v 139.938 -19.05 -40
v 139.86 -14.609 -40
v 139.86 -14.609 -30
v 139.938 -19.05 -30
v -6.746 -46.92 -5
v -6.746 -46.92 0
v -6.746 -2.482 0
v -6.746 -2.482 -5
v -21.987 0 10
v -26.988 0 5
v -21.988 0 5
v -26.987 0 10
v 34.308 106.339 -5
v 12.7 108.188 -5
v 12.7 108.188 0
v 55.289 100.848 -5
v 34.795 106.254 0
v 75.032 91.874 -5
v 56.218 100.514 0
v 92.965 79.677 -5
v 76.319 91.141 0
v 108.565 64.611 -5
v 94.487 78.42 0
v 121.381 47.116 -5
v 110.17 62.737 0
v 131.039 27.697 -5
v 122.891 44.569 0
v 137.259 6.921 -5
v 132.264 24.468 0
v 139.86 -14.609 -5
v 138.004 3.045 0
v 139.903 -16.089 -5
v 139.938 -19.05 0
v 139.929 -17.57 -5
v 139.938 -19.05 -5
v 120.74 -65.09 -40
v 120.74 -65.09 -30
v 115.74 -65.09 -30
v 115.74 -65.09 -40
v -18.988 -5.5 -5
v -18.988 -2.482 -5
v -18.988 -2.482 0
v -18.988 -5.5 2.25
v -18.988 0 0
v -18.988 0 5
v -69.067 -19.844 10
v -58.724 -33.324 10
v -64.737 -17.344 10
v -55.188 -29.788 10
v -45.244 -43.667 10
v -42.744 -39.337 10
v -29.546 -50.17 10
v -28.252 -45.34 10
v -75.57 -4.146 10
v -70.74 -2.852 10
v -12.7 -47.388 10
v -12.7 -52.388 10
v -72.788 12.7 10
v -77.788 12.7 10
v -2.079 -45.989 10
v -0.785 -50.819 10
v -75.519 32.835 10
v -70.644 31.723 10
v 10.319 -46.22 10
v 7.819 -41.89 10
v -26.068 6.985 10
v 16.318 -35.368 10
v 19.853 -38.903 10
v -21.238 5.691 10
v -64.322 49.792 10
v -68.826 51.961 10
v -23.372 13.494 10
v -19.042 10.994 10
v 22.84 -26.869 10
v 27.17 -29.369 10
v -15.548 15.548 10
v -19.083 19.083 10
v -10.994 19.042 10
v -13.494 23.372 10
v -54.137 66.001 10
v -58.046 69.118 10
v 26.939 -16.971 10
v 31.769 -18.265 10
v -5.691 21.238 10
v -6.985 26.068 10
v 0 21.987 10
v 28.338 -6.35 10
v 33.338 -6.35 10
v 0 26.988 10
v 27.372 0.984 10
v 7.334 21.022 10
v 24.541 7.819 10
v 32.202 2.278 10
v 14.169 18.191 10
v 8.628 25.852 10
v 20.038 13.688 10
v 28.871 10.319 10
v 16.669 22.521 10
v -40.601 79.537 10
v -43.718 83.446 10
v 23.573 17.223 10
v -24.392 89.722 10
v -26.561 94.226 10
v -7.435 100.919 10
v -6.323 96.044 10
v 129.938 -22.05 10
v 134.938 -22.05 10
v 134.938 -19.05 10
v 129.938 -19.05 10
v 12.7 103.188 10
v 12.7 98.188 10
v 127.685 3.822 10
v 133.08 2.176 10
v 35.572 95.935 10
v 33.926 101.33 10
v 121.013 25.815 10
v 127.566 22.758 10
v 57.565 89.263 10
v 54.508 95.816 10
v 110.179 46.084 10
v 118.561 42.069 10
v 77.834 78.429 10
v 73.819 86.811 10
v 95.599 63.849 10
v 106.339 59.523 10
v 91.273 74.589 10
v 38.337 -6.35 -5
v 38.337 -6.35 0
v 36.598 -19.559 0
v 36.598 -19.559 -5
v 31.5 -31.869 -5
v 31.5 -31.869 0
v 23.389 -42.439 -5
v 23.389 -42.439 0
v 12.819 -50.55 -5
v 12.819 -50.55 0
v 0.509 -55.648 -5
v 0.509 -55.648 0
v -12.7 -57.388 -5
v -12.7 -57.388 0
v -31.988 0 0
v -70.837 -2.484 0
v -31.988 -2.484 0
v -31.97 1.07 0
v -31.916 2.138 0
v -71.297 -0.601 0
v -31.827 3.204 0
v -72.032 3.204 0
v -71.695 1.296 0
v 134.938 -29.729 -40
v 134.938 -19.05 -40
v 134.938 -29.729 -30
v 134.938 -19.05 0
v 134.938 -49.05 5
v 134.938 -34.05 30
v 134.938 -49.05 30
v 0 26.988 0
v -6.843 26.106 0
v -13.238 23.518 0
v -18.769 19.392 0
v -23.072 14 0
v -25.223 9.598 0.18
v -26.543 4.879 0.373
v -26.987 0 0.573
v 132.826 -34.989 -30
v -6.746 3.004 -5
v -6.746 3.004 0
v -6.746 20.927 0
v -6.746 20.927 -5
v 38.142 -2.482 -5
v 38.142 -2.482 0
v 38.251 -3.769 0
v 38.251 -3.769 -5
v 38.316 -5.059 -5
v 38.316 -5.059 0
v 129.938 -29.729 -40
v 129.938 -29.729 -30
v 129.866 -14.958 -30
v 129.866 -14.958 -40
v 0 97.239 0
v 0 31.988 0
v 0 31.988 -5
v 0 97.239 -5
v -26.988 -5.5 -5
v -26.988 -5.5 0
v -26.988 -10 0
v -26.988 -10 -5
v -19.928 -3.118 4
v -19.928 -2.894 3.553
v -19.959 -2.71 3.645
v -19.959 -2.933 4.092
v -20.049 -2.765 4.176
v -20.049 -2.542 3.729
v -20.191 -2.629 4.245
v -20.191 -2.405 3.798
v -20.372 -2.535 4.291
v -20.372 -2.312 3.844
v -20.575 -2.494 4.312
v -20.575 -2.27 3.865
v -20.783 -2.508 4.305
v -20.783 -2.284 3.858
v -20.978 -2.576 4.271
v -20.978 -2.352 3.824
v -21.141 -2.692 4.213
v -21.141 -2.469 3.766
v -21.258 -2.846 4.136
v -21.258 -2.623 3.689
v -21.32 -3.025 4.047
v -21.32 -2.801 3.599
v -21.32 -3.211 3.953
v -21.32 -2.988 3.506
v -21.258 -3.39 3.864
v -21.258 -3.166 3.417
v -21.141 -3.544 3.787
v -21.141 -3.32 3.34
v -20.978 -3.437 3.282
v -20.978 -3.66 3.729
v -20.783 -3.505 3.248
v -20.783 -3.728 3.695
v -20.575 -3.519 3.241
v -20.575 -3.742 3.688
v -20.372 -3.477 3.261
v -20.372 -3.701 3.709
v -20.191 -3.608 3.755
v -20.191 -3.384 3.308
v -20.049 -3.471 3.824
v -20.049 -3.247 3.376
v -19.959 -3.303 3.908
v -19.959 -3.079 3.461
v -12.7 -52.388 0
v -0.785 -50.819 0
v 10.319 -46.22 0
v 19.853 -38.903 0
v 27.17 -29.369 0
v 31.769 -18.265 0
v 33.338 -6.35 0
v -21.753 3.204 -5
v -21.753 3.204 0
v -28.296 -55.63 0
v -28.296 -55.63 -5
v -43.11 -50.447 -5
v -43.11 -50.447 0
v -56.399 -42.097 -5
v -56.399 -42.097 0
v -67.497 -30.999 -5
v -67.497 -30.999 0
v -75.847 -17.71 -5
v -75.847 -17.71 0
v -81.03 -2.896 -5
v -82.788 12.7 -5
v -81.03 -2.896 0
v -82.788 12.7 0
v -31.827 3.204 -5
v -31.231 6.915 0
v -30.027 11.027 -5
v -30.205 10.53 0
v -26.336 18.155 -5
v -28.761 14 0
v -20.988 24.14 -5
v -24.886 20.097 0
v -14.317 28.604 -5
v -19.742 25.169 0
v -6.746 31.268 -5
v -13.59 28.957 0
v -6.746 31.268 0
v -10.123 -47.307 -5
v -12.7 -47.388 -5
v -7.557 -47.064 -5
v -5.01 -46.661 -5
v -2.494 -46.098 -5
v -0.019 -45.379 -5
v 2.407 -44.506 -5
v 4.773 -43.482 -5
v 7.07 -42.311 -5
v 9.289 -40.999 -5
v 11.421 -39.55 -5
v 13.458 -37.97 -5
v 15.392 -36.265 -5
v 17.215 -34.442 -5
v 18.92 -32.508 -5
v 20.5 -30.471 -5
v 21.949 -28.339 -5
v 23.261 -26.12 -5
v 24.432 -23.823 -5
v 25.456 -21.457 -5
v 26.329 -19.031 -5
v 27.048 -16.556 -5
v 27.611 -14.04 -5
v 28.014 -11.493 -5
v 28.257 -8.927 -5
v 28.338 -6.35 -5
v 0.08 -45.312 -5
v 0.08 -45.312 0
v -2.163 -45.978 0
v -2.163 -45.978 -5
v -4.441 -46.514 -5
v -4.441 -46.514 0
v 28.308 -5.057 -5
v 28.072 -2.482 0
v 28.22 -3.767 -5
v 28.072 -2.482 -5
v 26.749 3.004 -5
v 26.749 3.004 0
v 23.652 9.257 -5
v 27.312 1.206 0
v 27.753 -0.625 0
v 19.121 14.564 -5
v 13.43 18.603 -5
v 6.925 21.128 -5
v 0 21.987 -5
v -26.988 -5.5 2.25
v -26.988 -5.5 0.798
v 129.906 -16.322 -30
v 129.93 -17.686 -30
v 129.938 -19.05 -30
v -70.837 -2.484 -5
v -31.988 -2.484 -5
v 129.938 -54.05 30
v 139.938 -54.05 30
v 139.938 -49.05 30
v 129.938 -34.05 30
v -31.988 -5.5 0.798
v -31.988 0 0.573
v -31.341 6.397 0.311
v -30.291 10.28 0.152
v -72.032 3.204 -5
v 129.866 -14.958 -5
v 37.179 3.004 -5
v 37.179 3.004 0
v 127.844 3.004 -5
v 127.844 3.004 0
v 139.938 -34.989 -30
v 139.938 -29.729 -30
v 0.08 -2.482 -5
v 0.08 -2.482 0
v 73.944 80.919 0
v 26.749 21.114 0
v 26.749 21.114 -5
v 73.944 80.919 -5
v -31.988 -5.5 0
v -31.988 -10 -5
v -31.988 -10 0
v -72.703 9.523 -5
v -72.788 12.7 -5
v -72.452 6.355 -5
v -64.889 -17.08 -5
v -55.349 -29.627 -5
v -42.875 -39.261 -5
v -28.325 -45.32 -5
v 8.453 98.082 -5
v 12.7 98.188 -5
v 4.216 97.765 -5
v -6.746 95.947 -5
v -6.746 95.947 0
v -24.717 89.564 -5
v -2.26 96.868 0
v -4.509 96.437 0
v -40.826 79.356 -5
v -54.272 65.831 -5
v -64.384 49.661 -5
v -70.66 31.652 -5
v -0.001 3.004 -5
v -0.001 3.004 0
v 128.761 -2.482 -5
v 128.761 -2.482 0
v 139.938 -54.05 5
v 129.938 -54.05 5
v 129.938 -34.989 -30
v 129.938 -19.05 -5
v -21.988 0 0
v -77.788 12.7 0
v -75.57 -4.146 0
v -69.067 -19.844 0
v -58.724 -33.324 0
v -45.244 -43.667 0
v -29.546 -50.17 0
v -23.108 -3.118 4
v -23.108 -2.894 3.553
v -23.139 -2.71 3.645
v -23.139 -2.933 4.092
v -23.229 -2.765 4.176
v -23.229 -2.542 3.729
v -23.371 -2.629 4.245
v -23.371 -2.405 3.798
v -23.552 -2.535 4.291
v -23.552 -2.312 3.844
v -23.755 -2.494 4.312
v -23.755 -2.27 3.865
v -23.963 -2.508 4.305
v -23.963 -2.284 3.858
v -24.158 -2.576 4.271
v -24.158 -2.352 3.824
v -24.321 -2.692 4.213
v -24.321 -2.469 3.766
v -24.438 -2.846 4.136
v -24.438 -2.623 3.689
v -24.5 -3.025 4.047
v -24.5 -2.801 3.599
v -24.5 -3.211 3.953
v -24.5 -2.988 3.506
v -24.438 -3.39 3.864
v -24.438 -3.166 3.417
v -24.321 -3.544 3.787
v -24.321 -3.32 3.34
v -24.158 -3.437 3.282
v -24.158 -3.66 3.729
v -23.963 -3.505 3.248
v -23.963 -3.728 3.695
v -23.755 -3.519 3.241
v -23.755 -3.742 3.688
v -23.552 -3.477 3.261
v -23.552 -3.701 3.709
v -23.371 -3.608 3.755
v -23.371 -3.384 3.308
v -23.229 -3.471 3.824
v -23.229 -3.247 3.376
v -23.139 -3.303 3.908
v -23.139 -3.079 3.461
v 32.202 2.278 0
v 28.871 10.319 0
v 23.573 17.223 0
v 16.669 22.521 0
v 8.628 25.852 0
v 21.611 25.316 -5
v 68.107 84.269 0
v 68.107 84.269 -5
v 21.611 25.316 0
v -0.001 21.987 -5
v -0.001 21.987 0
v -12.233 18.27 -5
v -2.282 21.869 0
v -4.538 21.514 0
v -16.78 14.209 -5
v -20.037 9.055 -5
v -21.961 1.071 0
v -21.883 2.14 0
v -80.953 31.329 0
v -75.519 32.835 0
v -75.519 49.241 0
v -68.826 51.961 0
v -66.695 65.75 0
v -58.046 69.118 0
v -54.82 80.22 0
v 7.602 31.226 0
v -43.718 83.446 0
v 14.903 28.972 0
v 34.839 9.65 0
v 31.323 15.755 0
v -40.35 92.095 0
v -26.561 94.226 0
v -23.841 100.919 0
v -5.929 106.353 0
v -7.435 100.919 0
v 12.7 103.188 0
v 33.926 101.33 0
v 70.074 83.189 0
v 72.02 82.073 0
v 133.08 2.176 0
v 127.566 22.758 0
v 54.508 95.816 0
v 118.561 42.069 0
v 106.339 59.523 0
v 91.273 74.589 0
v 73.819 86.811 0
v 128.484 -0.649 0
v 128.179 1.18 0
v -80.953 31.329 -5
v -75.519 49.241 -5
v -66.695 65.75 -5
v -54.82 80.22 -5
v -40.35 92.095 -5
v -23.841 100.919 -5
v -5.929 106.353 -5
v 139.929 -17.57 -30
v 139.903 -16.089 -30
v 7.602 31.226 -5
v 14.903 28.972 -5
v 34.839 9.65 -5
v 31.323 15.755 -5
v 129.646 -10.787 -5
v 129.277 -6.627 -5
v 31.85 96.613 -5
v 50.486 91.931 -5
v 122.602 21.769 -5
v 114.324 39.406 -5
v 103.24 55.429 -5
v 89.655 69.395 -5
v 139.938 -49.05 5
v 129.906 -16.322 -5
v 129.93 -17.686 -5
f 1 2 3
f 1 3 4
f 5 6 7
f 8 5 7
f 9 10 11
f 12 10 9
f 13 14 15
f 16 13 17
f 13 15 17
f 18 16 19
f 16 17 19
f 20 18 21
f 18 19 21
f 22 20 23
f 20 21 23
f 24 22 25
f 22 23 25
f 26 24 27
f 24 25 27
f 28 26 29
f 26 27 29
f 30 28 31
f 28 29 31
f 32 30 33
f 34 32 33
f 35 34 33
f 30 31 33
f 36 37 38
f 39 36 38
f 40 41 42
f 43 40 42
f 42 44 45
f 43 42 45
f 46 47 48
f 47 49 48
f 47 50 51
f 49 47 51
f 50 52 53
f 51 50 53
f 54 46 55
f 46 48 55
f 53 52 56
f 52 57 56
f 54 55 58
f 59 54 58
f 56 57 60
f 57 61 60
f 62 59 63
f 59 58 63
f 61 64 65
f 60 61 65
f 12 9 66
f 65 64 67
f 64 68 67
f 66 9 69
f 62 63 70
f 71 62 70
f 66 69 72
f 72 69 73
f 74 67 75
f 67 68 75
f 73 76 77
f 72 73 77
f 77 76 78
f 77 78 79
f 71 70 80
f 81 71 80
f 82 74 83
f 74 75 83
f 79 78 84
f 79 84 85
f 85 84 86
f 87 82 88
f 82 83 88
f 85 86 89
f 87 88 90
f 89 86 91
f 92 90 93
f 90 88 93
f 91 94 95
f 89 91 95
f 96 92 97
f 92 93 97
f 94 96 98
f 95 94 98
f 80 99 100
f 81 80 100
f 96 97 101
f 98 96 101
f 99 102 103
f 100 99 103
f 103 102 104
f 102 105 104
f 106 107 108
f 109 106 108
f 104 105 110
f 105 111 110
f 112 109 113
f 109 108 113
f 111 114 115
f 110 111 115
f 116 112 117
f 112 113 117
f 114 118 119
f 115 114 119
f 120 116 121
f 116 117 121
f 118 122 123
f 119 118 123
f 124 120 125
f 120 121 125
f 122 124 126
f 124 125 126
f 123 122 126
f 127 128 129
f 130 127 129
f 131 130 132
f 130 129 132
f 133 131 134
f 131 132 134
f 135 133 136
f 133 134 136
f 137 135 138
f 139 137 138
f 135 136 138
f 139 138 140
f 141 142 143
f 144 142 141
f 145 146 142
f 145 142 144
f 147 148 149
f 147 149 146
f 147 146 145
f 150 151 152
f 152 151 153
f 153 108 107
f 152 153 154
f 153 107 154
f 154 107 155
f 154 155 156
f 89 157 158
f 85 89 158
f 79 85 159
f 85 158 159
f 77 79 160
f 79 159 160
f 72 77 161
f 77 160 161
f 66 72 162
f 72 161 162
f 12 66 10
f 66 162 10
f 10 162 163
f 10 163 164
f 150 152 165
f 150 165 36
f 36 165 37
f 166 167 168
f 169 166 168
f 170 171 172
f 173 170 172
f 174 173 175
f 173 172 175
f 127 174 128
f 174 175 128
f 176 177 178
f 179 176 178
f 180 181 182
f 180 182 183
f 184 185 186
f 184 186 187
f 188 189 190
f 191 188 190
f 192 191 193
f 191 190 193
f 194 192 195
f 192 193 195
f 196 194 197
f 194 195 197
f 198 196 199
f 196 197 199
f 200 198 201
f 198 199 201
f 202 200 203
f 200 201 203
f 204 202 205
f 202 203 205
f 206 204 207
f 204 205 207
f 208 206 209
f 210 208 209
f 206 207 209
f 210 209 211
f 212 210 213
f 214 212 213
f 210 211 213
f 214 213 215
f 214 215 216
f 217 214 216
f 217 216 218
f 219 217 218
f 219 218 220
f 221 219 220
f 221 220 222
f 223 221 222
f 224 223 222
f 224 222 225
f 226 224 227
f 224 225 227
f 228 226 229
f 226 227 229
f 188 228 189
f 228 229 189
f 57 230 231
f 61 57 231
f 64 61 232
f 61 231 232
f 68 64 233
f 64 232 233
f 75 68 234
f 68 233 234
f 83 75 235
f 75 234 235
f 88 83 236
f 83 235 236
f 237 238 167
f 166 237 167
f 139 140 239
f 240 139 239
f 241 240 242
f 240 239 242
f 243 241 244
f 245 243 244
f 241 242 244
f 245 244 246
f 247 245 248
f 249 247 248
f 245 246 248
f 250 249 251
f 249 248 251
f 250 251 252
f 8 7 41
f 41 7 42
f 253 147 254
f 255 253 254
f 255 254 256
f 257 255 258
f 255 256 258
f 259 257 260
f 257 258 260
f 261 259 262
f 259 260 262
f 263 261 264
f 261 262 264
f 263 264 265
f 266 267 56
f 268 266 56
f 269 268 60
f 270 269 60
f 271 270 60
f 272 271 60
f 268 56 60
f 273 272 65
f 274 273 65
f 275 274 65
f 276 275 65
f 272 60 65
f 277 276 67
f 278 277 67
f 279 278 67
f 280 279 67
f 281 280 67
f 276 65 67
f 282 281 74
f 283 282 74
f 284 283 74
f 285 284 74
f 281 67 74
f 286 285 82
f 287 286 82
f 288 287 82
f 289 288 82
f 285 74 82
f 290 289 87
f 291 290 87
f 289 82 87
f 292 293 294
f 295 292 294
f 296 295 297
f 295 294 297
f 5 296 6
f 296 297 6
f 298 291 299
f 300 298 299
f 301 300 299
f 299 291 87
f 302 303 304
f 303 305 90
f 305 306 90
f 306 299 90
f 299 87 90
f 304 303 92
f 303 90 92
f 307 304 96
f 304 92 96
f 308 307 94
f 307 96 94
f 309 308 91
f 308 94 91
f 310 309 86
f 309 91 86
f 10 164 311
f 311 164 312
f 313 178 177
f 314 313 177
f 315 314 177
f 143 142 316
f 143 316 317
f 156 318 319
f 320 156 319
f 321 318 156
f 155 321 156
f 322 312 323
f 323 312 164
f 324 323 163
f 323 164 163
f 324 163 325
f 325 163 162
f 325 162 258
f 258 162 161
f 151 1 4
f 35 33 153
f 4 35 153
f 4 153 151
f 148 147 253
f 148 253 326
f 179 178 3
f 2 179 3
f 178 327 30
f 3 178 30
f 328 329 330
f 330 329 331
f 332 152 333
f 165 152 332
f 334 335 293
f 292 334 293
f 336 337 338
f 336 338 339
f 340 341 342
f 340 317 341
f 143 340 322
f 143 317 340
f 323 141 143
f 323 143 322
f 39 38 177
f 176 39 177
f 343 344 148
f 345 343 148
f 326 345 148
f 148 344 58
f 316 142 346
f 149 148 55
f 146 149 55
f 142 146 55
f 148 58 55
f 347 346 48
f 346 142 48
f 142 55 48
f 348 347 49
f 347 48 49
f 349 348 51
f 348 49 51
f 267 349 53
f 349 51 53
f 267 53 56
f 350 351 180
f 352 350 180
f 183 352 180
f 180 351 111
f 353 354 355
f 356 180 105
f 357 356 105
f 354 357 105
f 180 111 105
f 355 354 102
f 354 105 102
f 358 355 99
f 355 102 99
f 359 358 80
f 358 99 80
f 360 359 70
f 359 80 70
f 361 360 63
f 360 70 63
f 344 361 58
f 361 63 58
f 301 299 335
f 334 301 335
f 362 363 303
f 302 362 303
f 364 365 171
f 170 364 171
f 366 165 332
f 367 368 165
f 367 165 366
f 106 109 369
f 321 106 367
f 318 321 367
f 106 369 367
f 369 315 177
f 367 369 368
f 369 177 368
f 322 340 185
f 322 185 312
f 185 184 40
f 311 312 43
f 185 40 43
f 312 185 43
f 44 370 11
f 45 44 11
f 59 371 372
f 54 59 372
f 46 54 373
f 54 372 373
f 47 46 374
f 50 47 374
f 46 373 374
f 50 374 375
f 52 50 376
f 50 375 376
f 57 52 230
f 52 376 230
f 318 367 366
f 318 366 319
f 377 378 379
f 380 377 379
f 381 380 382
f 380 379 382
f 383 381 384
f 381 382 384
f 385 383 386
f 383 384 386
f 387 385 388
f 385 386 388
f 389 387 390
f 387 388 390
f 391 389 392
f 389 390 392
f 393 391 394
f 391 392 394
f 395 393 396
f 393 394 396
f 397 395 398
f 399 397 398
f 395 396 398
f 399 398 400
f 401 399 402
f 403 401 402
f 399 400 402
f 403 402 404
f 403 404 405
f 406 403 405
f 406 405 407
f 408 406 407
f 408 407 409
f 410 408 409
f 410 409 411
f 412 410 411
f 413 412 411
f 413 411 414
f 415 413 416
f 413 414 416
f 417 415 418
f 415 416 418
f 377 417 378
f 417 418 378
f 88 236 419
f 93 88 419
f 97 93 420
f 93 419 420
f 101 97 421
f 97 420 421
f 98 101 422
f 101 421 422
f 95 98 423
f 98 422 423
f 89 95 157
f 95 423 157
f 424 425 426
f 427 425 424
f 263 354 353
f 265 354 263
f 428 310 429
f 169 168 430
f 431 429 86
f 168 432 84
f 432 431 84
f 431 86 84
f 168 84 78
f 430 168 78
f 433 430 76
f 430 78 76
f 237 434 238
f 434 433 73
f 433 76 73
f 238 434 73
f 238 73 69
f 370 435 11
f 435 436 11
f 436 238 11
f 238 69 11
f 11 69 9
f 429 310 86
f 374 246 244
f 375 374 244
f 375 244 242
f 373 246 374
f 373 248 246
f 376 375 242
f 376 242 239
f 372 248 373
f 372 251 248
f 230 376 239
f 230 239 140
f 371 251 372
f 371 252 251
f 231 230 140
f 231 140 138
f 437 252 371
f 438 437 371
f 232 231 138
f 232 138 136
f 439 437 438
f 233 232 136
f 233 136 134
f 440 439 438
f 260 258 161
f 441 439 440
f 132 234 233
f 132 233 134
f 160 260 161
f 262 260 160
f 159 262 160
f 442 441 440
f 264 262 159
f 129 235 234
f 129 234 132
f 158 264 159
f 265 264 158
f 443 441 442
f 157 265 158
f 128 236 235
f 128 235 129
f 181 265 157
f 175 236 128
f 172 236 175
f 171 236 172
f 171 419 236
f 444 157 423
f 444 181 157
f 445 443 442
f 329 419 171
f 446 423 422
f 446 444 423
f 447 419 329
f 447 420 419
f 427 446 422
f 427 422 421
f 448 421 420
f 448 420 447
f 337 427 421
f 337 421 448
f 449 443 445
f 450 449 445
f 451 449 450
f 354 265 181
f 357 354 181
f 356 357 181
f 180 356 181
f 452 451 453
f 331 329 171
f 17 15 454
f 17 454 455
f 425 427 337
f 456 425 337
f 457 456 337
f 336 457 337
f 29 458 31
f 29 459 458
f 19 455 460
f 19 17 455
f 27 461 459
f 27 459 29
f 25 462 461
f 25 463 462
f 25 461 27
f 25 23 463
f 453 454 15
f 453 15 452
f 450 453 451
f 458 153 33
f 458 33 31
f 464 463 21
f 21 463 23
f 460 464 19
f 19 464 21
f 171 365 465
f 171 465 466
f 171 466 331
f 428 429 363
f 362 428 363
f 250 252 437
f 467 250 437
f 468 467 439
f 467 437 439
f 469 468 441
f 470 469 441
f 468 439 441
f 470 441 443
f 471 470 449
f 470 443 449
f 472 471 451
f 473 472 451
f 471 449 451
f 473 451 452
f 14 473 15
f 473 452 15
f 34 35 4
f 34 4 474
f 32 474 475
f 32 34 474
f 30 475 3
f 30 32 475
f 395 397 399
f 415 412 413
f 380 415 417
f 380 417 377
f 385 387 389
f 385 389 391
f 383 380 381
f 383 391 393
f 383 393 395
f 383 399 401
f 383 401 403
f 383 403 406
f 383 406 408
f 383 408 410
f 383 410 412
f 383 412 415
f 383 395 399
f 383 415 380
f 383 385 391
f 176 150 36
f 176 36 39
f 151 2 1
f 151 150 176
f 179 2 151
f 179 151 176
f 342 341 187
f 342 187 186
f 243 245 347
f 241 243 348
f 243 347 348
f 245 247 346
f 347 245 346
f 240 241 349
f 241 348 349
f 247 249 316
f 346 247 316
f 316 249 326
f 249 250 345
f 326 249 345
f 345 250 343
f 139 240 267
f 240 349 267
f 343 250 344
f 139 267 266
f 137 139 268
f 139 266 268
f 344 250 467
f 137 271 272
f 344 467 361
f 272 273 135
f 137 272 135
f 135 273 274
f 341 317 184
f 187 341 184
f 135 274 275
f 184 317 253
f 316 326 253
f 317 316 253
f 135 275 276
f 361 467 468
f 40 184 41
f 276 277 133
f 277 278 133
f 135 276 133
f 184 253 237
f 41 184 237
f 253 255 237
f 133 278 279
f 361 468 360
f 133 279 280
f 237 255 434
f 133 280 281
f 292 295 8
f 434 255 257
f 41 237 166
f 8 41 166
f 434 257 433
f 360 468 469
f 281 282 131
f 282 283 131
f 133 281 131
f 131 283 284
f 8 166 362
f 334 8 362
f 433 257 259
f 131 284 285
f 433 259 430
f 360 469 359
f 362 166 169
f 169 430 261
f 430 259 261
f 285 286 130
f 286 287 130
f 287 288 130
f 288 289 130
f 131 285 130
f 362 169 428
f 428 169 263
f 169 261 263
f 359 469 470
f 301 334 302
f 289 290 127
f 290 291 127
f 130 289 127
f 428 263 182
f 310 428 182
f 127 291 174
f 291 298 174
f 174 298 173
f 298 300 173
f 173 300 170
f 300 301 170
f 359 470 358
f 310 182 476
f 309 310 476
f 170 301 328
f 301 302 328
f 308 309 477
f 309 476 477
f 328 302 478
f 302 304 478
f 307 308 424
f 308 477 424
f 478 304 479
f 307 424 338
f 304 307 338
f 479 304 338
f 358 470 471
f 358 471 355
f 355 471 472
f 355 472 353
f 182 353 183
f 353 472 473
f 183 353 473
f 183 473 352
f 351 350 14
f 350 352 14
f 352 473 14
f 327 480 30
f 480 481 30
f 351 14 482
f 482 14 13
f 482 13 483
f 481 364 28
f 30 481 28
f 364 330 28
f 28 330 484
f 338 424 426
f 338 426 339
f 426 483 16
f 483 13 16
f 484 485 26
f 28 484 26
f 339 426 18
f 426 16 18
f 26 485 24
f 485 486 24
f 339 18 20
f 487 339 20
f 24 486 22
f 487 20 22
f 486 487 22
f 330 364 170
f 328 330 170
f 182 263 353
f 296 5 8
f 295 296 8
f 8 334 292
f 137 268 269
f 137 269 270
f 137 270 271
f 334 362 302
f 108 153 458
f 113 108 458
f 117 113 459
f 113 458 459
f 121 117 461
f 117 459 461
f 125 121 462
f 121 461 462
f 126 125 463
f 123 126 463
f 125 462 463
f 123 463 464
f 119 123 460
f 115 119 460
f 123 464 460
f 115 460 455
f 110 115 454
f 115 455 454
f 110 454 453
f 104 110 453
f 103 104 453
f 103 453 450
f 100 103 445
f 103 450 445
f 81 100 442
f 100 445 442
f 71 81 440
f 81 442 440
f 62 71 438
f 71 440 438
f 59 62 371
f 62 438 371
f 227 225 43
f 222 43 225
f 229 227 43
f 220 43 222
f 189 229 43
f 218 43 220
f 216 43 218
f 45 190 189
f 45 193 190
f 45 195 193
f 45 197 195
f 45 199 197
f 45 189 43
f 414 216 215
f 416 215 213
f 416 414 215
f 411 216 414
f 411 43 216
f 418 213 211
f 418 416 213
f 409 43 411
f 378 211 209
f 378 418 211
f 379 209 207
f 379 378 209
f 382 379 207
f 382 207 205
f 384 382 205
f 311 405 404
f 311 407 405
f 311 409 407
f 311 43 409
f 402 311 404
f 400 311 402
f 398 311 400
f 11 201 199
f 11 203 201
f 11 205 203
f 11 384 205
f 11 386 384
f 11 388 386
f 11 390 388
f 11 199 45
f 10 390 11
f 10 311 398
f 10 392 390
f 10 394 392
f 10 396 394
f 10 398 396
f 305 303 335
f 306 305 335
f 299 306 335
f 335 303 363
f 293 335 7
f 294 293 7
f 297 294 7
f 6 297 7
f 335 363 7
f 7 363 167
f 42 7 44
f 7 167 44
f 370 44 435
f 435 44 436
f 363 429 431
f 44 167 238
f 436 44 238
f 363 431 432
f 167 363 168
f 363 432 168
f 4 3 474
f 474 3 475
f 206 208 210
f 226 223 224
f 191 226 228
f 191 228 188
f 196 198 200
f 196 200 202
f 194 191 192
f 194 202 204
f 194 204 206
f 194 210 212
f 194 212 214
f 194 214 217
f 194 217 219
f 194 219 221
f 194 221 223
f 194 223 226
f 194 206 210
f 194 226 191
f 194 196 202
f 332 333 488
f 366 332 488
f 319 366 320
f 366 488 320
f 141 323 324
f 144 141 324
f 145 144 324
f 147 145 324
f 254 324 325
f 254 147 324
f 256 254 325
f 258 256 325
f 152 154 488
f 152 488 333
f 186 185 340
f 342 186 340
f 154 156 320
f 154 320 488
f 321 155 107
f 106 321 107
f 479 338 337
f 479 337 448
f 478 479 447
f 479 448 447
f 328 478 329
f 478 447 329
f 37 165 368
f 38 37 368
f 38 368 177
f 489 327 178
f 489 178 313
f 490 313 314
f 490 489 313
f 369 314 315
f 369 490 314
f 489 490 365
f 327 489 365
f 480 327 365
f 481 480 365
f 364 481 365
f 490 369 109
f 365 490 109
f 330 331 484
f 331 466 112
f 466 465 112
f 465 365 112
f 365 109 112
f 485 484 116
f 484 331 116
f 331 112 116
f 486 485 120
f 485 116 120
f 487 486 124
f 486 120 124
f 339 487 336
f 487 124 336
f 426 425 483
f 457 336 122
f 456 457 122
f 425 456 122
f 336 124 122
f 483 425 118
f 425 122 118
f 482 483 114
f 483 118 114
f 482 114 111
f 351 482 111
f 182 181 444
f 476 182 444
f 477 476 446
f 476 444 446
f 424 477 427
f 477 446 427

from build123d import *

# Parameters (mm, degrees)
EXTRUDE2_DEPTH      = 10
EXTRUDE3_DEPTH      = 5
CUT_EXTRUDE1_DEPTH  = 5
EXTRUDE4_DEPTH      = 3
CUT_EXTRUDE2_DEPTH  = 8
EXTRUDE5_DEPTH      = 5
EXTRUDE5_DEPTH_BACK = 5
CUT_EXTRUDE3_DEPTH  = 5
SKETCH9_W           = 5
SKETCH9_H           = 15
EXTRUDE6_DEPTH      = 35
SKETCH11_W          = 5
SKETCH11_H          = 35
EXTRUDE8_DEPTH      = 25
EXTRUDE9_DEPTH      = 25
EXTRUDE12_DEPTH     = 20
EXTRUDE13_DEPTH     = 5
CUT_EXTRUDE5_DEPTH  = 5
EXTRUDE14_DEPTH     = 10
EXTRUDE19_DEPTH     = 5
SKETCH21_R          = 0.7
EXTRUDE20_DEPTH     = 0.5


with BuildPart() as part:
    # Sketch2 → Extrude2 (new body)
    with BuildSketch(Plane.XY):
        with BuildLine():
            Line((-26.9875, 0), (-26.9875, -10))
            Line((-26.9875, -10), (-21.9875, -10))
            Line((-21.9875, -10), (-21.9875, 0))
            ThreePointArc((-21.9875, 0), (-15.547510351, 15.547510351), (0, 21.9875))
            ThreePointArc((0, 21.9875), (20.037638412, 13.687638412), (28.3375, -6.35))
            ThreePointArc((28.3375, -6.35), (16.317894533, -35.367894533), (-12.7, -47.3875))
            ThreePointArc((-12.7, -47.3875), (-55.188278715, -29.788278715), (-72.7875, 12.7))
            ThreePointArc((-72.7875, 12.7), (-47.748790957, 73.148790957), (12.7, 98.1875))
            ThreePointArc((12.7, 98.1875), (95.599431259, 63.849431259), (129.9375, -19.05))
            Line((129.9375, -19.05), (134.9375, -19.05))
            ThreePointArc((134.9375, -19.05), (99.134965165, 67.384965165), (12.7, 103.1875))
            ThreePointArc((12.7, 103.1875), (-51.284324863, 76.684324863), (-77.7875, 12.7))
            ThreePointArc((-77.7875, 12.7), (-58.72381262, -33.32381262), (-12.7, -52.3875))
            ThreePointArc((-12.7, -52.3875), (19.853428439, -38.903428439), (33.3375, -6.35))
            ThreePointArc((33.3375, -6.35), (23.573172318, 17.223172318), (0, 26.9875))
            ThreePointArc((0, 26.9875), (-19.083044257, 19.083044257), (-26.9875, 0))
        make_face()
    extrude(amount=EXTRUDE2_DEPTH)

    # Sketch3 → Extrude3 (add)
    with BuildSketch(Plane.XY):
        with BuildLine():
            Line((-21.9875, 0), (-21.9875, -10))
            Line((-21.9875, -10), (-31.9875, -10))
            Line((-31.9875, -10), (-31.9875, 0))
            ThreePointArc((-31.9875, 0), (-22.618578163, 22.618578163), (0, 31.9875))
            ThreePointArc((0, 31.9875), (27.108706224, 20.758706224), (38.3375, -6.35))
            ThreePointArc((38.3375, -6.35), (23.388962345, -42.438962345), (-12.7, -57.3875))
            ThreePointArc((-12.7, -57.3875), (-62.259346526, -36.859346526), (-82.7875, 12.7))
            ThreePointArc((-82.7875, 12.7), (-54.819858769, 80.219858769), (12.7, 108.1875))
            ThreePointArc((12.7, 108.1875), (102.670499071, 70.920499071), (139.9375, -19.05))
            Line((139.9375, -19.05), (129.9375, -19.05))
            ThreePointArc((129.9375, -19.05), (95.599431259, 63.849431259), (12.7, 98.1875))
            ThreePointArc((12.7, 98.1875), (-47.748790957, 73.148790957), (-72.7875, 12.7))
            ThreePointArc((-72.7875, 12.7), (-55.188278715, -29.788278715), (-12.7, -47.3875))
            ThreePointArc((-12.7, -47.3875), (16.317894533, -35.367894533), (28.3375, -6.35))
            ThreePointArc((28.3375, -6.35), (20.037638412, 13.687638412), (0, 21.9875))
            ThreePointArc((0, 21.9875), (-15.547510351, 15.547510351), (-21.9875, 0))
        make_face()
    extrude(amount=-EXTRUDE3_DEPTH)

    # Sketch4 → Cut-Extrude1 (cut)
    with BuildSketch(Plane.ZY.offset(26.9875)):
        Polygon((0, -10), (5, 0), (10, 0), (10, -10), align=None)
    extrude(amount=-CUT_EXTRUDE1_DEPTH, mode=Mode.SUBTRACT)

    # Sketch5 → Extrude4 (add)
    with BuildSketch(Plane(origin=(-21.9875, 0, 0), x_dir=(0, 0, -1), z_dir=(1, 0, 0))):
        Polygon((0, -10), (-5, 0), (0, 0), (5, 0), (5, -10), align=None)
    extrude(amount=EXTRUDE4_DEPTH)

    # Sketch6 → Cut-Extrude2 (cut)
    with BuildSketch(Plane(origin=(-18.9875, 0, 0), x_dir=(0, 0, -1), z_dir=(1, 0, 0))):
        Polygon((5, -5.5), (-2.25, -5.5), (0, -10), (5, -10), align=None)
    extrude(amount=-CUT_EXTRUDE2_DEPTH, mode=Mode.SUBTRACT)

    # Sketch7 → Extrude5 (add, two sides)
    with BuildSketch(Plane.ZY.offset(26.9875)) as extrude5_sk:
        Polygon((0, -5.5), (0.798113635, -5.5), (0, 14), align=None)
    extrude(amount=EXTRUDE5_DEPTH)
    extrude(extrude5_sk.sketch, amount=-EXTRUDE5_DEPTH_BACK)

    # Sketch8 → Cut-Extrude3 (cut)
    with BuildSketch(Plane.XY):
        with BuildLine():
            Line((-28.761087536, 14), (-31.9875, 14))
            Line((-31.9875, 14), (-31.9875, 0))
            ThreePointArc((-31.9875, 0), (-31.170462331, 7.183483441), (-28.761087536, 14))
        make_face()
    extrude(amount=CUT_EXTRUDE3_DEPTH, mode=Mode.SUBTRACT)

    # Sketch9 → Extrude6 (add)
    with BuildSketch(Plane.XZ.offset(19.05)):
        with Locations((132.4375, 2.5)):
            Rectangle(SKETCH9_W, SKETCH9_H)
    extrude(amount=EXTRUDE6_DEPTH)

    # Sketch11 → Extrude8 (add)
    with BuildSketch(Plane(origin=(0, 0, -5), x_dir=(-1, 0, 0), z_dir=(0, 0, -1))):
        with Locations((-132.4375, -36.55)):
            Rectangle(SKETCH11_W, SKETCH11_H)
    extrude(amount=EXTRUDE8_DEPTH)

    # Sketch12 → Extrude9 (add)
    with BuildSketch(Plane(origin=(0, 0, -5), x_dir=(-1, 0, 0), z_dir=(0, 0, -1))):
        with BuildLine():
            Line((-129.9375, -19.05), (-139.9375, -19.05))
            ThreePointArc((-139.9375, -19.05), (-139.918121112, -16.829399436), (-139.859990353, -14.609475288))
            Line((-139.859990353, -14.609475288), (-129.866082083, -14.958470255))
            ThreePointArc((-129.866082083, -14.958470255), (-129.919644161, -17.0039235), (-129.9375, -19.05))
        make_face()
    extrude(amount=EXTRUDE9_DEPTH)

    # Sketch16 → Extrude12 (add)
    with BuildSketch(Plane.XY.offset(10)):
        Polygon((129.9375, -19.05), (129.9375, -54.05), (139.9375, -54.05), (139.9375, -49.05), (134.9375, -49.05), (134.9375, -19.05), align=None)
    extrude(amount=EXTRUDE12_DEPTH)

    # Sketch17 → Extrude13 (add)
    with BuildSketch(Plane(origin=(134.9375, 0, 0), x_dir=(0, 0, -1), z_dir=(1, 0, 0))):
        Polygon((-10, -54.05), (-10, -49.05), (-5, -49.05), (30, -29.72873513), (30, -34.988734421), (-5, -54.05), align=None)
    extrude(amount=EXTRUDE13_DEPTH)

    # Sketch18 → Cut-Extrude5 (cut)
    with BuildSketch(Plane(origin=(134.9375, 0, 0), x_dir=(0, 0, -1), z_dir=(1, 0, 0))):
        Polygon((-5, -54.05), (30, -34.988734421), (30, -54.05), align=None)
        Polygon((-30, -19.05), (-30, -34.05), (-10, -22.05), (-10, -19.05), align=None)
    extrude(amount=-CUT_EXTRUDE5_DEPTH, mode=Mode.SUBTRACT)

    # Sketch19 → Extrude14 (add)
    with BuildSketch(Plane(origin=(0, 0, -30), x_dir=(-1, 0, 0), z_dir=(0, 0, -1))):
        Polygon((-134.9375, -19.05), (-134.9375, -29.72873513), (-120.74, -65.09), (-115.74, -65.09), (-129.9375, -29.72873513), (-129.866082083, -14.958470255), (-139.859990353, -14.609475288), (-139.9375, -19.05), align=None)
    extrude(amount=EXTRUDE14_DEPTH)

    # Sketch20 → Extrude19 (add)
    with BuildSketch(Plane.XY):
        with BuildLine():
            Line((128.760903372, -2.482015371), (38.141874641, -2.482015371))
            ThreePointArc((38.141874641, -2.482015371), (37.760120708, 0.278513435), (37.178841709, 3.004017073))
            Line((37.178841709, 3.004017073), (127.844482009, 3.004017073))
            ThreePointArc((127.844482009, 3.004017073), (128.335231203, 0.266436289), (128.760903372, -2.482015371))
        make_face()
        with BuildLine():
            Line((0, 31.9875), (0, 97.238882511))
            ThreePointArc((0, 97.238882511), (-3.385770157, 96.660470787), (-6.745571925, 95.946515776))
            Line((-6.745571925, 95.946515776), (-6.745571925, 31.268153378))
            ThreePointArc((-6.745571925, 31.268153378), (-3.391909497, 31.807154953), (0, 31.9875))
        make_face()
        with BuildLine():
            Line((-0.000749496, 21.987499987), (-0.000749496, 3.004017073))
            Line((-0.000749496, 3.004017073), (26.74913589, 3.004017073))
            ThreePointArc((26.74913589, 3.004017073), (27.547611511, 0.294020339), (28.072274599, -2.482015371))
            Line((28.072274599, -2.482015371), (0.080484541, -2.482015371))
            Line((0.080484541, -2.482015371), (0.080484541, -45.312306862))
            ThreePointArc((0.080484541, -45.312306862), (-3.298138872, -46.262230565), (-6.745571925, -46.919996909))
            Line((-6.745571925, -46.919996909), (-6.745571925, -2.482015371))
            Line((-6.745571925, -2.482015371), (-18.9875, -2.482015371))
            Line((-18.9875, -2.482015371), (-18.9875, 0))
            Line((-18.9875, 0), (-21.9875, 0))
            ThreePointArc((-21.9875, 0), (-21.928738235, 1.606423254), (-21.752767023, 3.20426015))
            Line((-21.752767023, 3.20426015), (-6.745571925, 3.004017073))
            Line((-6.745571925, 3.004017073), (-6.745571925, 20.92719321))
            ThreePointArc((-6.745571925, 20.92719321), (-3.414568171, 21.720747696), (-0.000749496, 21.987499987))
        make_face()
        with BuildLine():
            Line((-31.826606372, 3.20426015), (-50.922171332, 3.20426015))
            Line((-50.922171332, 3.20426015), (-72.032441219, 3.20426015))
            ThreePointArc((-72.032441219, 3.20426015), (-71.503716958, 0.345627166), (-70.83734731, -2.484087197))
            Line((-70.83734731, -2.484087197), (-50.922171332, -2.484087197))
            Line((-50.922171332, -2.484087197), (-31.9875, -2.484087197))
            Line((-31.9875, -2.484087197), (-31.9875, 0))
            ThreePointArc((-31.9875, 0), (-31.947251271, 1.604148518), (-31.826606372, 3.20426015))
        make_face()
        with BuildLine():
            Line((26.74913589, 21.11356924), (73.944333787, 80.918810062))
            ThreePointArc((73.944333787, 80.918810062), (71.049492521, 82.635633837), (68.106562726, 84.268653752))
            Line((68.106562726, 84.268653752), (21.610975976, 25.315906329))
            ThreePointArc((21.610975976, 25.315906329), (24.271176613, 23.326150223), (26.74913589, 21.11356924))
        make_face()
    extrude(amount=-EXTRUDE19_DEPTH)

    # Sketch21 → Extrude20 (add)
    with BuildSketch(Plane(origin=(0, -2, 4), x_dir=(1, 0, 0), z_dir=(0, -0.447213595, 0.894427191))):
        with Locations((-23.8075, -1)):
            Circle(SKETCH21_R)
        with Locations((-20.6275, -1)):
            Circle(SKETCH21_R)
    extrude(amount=EXTRUDE20_DEPTH)


solid = part.part
